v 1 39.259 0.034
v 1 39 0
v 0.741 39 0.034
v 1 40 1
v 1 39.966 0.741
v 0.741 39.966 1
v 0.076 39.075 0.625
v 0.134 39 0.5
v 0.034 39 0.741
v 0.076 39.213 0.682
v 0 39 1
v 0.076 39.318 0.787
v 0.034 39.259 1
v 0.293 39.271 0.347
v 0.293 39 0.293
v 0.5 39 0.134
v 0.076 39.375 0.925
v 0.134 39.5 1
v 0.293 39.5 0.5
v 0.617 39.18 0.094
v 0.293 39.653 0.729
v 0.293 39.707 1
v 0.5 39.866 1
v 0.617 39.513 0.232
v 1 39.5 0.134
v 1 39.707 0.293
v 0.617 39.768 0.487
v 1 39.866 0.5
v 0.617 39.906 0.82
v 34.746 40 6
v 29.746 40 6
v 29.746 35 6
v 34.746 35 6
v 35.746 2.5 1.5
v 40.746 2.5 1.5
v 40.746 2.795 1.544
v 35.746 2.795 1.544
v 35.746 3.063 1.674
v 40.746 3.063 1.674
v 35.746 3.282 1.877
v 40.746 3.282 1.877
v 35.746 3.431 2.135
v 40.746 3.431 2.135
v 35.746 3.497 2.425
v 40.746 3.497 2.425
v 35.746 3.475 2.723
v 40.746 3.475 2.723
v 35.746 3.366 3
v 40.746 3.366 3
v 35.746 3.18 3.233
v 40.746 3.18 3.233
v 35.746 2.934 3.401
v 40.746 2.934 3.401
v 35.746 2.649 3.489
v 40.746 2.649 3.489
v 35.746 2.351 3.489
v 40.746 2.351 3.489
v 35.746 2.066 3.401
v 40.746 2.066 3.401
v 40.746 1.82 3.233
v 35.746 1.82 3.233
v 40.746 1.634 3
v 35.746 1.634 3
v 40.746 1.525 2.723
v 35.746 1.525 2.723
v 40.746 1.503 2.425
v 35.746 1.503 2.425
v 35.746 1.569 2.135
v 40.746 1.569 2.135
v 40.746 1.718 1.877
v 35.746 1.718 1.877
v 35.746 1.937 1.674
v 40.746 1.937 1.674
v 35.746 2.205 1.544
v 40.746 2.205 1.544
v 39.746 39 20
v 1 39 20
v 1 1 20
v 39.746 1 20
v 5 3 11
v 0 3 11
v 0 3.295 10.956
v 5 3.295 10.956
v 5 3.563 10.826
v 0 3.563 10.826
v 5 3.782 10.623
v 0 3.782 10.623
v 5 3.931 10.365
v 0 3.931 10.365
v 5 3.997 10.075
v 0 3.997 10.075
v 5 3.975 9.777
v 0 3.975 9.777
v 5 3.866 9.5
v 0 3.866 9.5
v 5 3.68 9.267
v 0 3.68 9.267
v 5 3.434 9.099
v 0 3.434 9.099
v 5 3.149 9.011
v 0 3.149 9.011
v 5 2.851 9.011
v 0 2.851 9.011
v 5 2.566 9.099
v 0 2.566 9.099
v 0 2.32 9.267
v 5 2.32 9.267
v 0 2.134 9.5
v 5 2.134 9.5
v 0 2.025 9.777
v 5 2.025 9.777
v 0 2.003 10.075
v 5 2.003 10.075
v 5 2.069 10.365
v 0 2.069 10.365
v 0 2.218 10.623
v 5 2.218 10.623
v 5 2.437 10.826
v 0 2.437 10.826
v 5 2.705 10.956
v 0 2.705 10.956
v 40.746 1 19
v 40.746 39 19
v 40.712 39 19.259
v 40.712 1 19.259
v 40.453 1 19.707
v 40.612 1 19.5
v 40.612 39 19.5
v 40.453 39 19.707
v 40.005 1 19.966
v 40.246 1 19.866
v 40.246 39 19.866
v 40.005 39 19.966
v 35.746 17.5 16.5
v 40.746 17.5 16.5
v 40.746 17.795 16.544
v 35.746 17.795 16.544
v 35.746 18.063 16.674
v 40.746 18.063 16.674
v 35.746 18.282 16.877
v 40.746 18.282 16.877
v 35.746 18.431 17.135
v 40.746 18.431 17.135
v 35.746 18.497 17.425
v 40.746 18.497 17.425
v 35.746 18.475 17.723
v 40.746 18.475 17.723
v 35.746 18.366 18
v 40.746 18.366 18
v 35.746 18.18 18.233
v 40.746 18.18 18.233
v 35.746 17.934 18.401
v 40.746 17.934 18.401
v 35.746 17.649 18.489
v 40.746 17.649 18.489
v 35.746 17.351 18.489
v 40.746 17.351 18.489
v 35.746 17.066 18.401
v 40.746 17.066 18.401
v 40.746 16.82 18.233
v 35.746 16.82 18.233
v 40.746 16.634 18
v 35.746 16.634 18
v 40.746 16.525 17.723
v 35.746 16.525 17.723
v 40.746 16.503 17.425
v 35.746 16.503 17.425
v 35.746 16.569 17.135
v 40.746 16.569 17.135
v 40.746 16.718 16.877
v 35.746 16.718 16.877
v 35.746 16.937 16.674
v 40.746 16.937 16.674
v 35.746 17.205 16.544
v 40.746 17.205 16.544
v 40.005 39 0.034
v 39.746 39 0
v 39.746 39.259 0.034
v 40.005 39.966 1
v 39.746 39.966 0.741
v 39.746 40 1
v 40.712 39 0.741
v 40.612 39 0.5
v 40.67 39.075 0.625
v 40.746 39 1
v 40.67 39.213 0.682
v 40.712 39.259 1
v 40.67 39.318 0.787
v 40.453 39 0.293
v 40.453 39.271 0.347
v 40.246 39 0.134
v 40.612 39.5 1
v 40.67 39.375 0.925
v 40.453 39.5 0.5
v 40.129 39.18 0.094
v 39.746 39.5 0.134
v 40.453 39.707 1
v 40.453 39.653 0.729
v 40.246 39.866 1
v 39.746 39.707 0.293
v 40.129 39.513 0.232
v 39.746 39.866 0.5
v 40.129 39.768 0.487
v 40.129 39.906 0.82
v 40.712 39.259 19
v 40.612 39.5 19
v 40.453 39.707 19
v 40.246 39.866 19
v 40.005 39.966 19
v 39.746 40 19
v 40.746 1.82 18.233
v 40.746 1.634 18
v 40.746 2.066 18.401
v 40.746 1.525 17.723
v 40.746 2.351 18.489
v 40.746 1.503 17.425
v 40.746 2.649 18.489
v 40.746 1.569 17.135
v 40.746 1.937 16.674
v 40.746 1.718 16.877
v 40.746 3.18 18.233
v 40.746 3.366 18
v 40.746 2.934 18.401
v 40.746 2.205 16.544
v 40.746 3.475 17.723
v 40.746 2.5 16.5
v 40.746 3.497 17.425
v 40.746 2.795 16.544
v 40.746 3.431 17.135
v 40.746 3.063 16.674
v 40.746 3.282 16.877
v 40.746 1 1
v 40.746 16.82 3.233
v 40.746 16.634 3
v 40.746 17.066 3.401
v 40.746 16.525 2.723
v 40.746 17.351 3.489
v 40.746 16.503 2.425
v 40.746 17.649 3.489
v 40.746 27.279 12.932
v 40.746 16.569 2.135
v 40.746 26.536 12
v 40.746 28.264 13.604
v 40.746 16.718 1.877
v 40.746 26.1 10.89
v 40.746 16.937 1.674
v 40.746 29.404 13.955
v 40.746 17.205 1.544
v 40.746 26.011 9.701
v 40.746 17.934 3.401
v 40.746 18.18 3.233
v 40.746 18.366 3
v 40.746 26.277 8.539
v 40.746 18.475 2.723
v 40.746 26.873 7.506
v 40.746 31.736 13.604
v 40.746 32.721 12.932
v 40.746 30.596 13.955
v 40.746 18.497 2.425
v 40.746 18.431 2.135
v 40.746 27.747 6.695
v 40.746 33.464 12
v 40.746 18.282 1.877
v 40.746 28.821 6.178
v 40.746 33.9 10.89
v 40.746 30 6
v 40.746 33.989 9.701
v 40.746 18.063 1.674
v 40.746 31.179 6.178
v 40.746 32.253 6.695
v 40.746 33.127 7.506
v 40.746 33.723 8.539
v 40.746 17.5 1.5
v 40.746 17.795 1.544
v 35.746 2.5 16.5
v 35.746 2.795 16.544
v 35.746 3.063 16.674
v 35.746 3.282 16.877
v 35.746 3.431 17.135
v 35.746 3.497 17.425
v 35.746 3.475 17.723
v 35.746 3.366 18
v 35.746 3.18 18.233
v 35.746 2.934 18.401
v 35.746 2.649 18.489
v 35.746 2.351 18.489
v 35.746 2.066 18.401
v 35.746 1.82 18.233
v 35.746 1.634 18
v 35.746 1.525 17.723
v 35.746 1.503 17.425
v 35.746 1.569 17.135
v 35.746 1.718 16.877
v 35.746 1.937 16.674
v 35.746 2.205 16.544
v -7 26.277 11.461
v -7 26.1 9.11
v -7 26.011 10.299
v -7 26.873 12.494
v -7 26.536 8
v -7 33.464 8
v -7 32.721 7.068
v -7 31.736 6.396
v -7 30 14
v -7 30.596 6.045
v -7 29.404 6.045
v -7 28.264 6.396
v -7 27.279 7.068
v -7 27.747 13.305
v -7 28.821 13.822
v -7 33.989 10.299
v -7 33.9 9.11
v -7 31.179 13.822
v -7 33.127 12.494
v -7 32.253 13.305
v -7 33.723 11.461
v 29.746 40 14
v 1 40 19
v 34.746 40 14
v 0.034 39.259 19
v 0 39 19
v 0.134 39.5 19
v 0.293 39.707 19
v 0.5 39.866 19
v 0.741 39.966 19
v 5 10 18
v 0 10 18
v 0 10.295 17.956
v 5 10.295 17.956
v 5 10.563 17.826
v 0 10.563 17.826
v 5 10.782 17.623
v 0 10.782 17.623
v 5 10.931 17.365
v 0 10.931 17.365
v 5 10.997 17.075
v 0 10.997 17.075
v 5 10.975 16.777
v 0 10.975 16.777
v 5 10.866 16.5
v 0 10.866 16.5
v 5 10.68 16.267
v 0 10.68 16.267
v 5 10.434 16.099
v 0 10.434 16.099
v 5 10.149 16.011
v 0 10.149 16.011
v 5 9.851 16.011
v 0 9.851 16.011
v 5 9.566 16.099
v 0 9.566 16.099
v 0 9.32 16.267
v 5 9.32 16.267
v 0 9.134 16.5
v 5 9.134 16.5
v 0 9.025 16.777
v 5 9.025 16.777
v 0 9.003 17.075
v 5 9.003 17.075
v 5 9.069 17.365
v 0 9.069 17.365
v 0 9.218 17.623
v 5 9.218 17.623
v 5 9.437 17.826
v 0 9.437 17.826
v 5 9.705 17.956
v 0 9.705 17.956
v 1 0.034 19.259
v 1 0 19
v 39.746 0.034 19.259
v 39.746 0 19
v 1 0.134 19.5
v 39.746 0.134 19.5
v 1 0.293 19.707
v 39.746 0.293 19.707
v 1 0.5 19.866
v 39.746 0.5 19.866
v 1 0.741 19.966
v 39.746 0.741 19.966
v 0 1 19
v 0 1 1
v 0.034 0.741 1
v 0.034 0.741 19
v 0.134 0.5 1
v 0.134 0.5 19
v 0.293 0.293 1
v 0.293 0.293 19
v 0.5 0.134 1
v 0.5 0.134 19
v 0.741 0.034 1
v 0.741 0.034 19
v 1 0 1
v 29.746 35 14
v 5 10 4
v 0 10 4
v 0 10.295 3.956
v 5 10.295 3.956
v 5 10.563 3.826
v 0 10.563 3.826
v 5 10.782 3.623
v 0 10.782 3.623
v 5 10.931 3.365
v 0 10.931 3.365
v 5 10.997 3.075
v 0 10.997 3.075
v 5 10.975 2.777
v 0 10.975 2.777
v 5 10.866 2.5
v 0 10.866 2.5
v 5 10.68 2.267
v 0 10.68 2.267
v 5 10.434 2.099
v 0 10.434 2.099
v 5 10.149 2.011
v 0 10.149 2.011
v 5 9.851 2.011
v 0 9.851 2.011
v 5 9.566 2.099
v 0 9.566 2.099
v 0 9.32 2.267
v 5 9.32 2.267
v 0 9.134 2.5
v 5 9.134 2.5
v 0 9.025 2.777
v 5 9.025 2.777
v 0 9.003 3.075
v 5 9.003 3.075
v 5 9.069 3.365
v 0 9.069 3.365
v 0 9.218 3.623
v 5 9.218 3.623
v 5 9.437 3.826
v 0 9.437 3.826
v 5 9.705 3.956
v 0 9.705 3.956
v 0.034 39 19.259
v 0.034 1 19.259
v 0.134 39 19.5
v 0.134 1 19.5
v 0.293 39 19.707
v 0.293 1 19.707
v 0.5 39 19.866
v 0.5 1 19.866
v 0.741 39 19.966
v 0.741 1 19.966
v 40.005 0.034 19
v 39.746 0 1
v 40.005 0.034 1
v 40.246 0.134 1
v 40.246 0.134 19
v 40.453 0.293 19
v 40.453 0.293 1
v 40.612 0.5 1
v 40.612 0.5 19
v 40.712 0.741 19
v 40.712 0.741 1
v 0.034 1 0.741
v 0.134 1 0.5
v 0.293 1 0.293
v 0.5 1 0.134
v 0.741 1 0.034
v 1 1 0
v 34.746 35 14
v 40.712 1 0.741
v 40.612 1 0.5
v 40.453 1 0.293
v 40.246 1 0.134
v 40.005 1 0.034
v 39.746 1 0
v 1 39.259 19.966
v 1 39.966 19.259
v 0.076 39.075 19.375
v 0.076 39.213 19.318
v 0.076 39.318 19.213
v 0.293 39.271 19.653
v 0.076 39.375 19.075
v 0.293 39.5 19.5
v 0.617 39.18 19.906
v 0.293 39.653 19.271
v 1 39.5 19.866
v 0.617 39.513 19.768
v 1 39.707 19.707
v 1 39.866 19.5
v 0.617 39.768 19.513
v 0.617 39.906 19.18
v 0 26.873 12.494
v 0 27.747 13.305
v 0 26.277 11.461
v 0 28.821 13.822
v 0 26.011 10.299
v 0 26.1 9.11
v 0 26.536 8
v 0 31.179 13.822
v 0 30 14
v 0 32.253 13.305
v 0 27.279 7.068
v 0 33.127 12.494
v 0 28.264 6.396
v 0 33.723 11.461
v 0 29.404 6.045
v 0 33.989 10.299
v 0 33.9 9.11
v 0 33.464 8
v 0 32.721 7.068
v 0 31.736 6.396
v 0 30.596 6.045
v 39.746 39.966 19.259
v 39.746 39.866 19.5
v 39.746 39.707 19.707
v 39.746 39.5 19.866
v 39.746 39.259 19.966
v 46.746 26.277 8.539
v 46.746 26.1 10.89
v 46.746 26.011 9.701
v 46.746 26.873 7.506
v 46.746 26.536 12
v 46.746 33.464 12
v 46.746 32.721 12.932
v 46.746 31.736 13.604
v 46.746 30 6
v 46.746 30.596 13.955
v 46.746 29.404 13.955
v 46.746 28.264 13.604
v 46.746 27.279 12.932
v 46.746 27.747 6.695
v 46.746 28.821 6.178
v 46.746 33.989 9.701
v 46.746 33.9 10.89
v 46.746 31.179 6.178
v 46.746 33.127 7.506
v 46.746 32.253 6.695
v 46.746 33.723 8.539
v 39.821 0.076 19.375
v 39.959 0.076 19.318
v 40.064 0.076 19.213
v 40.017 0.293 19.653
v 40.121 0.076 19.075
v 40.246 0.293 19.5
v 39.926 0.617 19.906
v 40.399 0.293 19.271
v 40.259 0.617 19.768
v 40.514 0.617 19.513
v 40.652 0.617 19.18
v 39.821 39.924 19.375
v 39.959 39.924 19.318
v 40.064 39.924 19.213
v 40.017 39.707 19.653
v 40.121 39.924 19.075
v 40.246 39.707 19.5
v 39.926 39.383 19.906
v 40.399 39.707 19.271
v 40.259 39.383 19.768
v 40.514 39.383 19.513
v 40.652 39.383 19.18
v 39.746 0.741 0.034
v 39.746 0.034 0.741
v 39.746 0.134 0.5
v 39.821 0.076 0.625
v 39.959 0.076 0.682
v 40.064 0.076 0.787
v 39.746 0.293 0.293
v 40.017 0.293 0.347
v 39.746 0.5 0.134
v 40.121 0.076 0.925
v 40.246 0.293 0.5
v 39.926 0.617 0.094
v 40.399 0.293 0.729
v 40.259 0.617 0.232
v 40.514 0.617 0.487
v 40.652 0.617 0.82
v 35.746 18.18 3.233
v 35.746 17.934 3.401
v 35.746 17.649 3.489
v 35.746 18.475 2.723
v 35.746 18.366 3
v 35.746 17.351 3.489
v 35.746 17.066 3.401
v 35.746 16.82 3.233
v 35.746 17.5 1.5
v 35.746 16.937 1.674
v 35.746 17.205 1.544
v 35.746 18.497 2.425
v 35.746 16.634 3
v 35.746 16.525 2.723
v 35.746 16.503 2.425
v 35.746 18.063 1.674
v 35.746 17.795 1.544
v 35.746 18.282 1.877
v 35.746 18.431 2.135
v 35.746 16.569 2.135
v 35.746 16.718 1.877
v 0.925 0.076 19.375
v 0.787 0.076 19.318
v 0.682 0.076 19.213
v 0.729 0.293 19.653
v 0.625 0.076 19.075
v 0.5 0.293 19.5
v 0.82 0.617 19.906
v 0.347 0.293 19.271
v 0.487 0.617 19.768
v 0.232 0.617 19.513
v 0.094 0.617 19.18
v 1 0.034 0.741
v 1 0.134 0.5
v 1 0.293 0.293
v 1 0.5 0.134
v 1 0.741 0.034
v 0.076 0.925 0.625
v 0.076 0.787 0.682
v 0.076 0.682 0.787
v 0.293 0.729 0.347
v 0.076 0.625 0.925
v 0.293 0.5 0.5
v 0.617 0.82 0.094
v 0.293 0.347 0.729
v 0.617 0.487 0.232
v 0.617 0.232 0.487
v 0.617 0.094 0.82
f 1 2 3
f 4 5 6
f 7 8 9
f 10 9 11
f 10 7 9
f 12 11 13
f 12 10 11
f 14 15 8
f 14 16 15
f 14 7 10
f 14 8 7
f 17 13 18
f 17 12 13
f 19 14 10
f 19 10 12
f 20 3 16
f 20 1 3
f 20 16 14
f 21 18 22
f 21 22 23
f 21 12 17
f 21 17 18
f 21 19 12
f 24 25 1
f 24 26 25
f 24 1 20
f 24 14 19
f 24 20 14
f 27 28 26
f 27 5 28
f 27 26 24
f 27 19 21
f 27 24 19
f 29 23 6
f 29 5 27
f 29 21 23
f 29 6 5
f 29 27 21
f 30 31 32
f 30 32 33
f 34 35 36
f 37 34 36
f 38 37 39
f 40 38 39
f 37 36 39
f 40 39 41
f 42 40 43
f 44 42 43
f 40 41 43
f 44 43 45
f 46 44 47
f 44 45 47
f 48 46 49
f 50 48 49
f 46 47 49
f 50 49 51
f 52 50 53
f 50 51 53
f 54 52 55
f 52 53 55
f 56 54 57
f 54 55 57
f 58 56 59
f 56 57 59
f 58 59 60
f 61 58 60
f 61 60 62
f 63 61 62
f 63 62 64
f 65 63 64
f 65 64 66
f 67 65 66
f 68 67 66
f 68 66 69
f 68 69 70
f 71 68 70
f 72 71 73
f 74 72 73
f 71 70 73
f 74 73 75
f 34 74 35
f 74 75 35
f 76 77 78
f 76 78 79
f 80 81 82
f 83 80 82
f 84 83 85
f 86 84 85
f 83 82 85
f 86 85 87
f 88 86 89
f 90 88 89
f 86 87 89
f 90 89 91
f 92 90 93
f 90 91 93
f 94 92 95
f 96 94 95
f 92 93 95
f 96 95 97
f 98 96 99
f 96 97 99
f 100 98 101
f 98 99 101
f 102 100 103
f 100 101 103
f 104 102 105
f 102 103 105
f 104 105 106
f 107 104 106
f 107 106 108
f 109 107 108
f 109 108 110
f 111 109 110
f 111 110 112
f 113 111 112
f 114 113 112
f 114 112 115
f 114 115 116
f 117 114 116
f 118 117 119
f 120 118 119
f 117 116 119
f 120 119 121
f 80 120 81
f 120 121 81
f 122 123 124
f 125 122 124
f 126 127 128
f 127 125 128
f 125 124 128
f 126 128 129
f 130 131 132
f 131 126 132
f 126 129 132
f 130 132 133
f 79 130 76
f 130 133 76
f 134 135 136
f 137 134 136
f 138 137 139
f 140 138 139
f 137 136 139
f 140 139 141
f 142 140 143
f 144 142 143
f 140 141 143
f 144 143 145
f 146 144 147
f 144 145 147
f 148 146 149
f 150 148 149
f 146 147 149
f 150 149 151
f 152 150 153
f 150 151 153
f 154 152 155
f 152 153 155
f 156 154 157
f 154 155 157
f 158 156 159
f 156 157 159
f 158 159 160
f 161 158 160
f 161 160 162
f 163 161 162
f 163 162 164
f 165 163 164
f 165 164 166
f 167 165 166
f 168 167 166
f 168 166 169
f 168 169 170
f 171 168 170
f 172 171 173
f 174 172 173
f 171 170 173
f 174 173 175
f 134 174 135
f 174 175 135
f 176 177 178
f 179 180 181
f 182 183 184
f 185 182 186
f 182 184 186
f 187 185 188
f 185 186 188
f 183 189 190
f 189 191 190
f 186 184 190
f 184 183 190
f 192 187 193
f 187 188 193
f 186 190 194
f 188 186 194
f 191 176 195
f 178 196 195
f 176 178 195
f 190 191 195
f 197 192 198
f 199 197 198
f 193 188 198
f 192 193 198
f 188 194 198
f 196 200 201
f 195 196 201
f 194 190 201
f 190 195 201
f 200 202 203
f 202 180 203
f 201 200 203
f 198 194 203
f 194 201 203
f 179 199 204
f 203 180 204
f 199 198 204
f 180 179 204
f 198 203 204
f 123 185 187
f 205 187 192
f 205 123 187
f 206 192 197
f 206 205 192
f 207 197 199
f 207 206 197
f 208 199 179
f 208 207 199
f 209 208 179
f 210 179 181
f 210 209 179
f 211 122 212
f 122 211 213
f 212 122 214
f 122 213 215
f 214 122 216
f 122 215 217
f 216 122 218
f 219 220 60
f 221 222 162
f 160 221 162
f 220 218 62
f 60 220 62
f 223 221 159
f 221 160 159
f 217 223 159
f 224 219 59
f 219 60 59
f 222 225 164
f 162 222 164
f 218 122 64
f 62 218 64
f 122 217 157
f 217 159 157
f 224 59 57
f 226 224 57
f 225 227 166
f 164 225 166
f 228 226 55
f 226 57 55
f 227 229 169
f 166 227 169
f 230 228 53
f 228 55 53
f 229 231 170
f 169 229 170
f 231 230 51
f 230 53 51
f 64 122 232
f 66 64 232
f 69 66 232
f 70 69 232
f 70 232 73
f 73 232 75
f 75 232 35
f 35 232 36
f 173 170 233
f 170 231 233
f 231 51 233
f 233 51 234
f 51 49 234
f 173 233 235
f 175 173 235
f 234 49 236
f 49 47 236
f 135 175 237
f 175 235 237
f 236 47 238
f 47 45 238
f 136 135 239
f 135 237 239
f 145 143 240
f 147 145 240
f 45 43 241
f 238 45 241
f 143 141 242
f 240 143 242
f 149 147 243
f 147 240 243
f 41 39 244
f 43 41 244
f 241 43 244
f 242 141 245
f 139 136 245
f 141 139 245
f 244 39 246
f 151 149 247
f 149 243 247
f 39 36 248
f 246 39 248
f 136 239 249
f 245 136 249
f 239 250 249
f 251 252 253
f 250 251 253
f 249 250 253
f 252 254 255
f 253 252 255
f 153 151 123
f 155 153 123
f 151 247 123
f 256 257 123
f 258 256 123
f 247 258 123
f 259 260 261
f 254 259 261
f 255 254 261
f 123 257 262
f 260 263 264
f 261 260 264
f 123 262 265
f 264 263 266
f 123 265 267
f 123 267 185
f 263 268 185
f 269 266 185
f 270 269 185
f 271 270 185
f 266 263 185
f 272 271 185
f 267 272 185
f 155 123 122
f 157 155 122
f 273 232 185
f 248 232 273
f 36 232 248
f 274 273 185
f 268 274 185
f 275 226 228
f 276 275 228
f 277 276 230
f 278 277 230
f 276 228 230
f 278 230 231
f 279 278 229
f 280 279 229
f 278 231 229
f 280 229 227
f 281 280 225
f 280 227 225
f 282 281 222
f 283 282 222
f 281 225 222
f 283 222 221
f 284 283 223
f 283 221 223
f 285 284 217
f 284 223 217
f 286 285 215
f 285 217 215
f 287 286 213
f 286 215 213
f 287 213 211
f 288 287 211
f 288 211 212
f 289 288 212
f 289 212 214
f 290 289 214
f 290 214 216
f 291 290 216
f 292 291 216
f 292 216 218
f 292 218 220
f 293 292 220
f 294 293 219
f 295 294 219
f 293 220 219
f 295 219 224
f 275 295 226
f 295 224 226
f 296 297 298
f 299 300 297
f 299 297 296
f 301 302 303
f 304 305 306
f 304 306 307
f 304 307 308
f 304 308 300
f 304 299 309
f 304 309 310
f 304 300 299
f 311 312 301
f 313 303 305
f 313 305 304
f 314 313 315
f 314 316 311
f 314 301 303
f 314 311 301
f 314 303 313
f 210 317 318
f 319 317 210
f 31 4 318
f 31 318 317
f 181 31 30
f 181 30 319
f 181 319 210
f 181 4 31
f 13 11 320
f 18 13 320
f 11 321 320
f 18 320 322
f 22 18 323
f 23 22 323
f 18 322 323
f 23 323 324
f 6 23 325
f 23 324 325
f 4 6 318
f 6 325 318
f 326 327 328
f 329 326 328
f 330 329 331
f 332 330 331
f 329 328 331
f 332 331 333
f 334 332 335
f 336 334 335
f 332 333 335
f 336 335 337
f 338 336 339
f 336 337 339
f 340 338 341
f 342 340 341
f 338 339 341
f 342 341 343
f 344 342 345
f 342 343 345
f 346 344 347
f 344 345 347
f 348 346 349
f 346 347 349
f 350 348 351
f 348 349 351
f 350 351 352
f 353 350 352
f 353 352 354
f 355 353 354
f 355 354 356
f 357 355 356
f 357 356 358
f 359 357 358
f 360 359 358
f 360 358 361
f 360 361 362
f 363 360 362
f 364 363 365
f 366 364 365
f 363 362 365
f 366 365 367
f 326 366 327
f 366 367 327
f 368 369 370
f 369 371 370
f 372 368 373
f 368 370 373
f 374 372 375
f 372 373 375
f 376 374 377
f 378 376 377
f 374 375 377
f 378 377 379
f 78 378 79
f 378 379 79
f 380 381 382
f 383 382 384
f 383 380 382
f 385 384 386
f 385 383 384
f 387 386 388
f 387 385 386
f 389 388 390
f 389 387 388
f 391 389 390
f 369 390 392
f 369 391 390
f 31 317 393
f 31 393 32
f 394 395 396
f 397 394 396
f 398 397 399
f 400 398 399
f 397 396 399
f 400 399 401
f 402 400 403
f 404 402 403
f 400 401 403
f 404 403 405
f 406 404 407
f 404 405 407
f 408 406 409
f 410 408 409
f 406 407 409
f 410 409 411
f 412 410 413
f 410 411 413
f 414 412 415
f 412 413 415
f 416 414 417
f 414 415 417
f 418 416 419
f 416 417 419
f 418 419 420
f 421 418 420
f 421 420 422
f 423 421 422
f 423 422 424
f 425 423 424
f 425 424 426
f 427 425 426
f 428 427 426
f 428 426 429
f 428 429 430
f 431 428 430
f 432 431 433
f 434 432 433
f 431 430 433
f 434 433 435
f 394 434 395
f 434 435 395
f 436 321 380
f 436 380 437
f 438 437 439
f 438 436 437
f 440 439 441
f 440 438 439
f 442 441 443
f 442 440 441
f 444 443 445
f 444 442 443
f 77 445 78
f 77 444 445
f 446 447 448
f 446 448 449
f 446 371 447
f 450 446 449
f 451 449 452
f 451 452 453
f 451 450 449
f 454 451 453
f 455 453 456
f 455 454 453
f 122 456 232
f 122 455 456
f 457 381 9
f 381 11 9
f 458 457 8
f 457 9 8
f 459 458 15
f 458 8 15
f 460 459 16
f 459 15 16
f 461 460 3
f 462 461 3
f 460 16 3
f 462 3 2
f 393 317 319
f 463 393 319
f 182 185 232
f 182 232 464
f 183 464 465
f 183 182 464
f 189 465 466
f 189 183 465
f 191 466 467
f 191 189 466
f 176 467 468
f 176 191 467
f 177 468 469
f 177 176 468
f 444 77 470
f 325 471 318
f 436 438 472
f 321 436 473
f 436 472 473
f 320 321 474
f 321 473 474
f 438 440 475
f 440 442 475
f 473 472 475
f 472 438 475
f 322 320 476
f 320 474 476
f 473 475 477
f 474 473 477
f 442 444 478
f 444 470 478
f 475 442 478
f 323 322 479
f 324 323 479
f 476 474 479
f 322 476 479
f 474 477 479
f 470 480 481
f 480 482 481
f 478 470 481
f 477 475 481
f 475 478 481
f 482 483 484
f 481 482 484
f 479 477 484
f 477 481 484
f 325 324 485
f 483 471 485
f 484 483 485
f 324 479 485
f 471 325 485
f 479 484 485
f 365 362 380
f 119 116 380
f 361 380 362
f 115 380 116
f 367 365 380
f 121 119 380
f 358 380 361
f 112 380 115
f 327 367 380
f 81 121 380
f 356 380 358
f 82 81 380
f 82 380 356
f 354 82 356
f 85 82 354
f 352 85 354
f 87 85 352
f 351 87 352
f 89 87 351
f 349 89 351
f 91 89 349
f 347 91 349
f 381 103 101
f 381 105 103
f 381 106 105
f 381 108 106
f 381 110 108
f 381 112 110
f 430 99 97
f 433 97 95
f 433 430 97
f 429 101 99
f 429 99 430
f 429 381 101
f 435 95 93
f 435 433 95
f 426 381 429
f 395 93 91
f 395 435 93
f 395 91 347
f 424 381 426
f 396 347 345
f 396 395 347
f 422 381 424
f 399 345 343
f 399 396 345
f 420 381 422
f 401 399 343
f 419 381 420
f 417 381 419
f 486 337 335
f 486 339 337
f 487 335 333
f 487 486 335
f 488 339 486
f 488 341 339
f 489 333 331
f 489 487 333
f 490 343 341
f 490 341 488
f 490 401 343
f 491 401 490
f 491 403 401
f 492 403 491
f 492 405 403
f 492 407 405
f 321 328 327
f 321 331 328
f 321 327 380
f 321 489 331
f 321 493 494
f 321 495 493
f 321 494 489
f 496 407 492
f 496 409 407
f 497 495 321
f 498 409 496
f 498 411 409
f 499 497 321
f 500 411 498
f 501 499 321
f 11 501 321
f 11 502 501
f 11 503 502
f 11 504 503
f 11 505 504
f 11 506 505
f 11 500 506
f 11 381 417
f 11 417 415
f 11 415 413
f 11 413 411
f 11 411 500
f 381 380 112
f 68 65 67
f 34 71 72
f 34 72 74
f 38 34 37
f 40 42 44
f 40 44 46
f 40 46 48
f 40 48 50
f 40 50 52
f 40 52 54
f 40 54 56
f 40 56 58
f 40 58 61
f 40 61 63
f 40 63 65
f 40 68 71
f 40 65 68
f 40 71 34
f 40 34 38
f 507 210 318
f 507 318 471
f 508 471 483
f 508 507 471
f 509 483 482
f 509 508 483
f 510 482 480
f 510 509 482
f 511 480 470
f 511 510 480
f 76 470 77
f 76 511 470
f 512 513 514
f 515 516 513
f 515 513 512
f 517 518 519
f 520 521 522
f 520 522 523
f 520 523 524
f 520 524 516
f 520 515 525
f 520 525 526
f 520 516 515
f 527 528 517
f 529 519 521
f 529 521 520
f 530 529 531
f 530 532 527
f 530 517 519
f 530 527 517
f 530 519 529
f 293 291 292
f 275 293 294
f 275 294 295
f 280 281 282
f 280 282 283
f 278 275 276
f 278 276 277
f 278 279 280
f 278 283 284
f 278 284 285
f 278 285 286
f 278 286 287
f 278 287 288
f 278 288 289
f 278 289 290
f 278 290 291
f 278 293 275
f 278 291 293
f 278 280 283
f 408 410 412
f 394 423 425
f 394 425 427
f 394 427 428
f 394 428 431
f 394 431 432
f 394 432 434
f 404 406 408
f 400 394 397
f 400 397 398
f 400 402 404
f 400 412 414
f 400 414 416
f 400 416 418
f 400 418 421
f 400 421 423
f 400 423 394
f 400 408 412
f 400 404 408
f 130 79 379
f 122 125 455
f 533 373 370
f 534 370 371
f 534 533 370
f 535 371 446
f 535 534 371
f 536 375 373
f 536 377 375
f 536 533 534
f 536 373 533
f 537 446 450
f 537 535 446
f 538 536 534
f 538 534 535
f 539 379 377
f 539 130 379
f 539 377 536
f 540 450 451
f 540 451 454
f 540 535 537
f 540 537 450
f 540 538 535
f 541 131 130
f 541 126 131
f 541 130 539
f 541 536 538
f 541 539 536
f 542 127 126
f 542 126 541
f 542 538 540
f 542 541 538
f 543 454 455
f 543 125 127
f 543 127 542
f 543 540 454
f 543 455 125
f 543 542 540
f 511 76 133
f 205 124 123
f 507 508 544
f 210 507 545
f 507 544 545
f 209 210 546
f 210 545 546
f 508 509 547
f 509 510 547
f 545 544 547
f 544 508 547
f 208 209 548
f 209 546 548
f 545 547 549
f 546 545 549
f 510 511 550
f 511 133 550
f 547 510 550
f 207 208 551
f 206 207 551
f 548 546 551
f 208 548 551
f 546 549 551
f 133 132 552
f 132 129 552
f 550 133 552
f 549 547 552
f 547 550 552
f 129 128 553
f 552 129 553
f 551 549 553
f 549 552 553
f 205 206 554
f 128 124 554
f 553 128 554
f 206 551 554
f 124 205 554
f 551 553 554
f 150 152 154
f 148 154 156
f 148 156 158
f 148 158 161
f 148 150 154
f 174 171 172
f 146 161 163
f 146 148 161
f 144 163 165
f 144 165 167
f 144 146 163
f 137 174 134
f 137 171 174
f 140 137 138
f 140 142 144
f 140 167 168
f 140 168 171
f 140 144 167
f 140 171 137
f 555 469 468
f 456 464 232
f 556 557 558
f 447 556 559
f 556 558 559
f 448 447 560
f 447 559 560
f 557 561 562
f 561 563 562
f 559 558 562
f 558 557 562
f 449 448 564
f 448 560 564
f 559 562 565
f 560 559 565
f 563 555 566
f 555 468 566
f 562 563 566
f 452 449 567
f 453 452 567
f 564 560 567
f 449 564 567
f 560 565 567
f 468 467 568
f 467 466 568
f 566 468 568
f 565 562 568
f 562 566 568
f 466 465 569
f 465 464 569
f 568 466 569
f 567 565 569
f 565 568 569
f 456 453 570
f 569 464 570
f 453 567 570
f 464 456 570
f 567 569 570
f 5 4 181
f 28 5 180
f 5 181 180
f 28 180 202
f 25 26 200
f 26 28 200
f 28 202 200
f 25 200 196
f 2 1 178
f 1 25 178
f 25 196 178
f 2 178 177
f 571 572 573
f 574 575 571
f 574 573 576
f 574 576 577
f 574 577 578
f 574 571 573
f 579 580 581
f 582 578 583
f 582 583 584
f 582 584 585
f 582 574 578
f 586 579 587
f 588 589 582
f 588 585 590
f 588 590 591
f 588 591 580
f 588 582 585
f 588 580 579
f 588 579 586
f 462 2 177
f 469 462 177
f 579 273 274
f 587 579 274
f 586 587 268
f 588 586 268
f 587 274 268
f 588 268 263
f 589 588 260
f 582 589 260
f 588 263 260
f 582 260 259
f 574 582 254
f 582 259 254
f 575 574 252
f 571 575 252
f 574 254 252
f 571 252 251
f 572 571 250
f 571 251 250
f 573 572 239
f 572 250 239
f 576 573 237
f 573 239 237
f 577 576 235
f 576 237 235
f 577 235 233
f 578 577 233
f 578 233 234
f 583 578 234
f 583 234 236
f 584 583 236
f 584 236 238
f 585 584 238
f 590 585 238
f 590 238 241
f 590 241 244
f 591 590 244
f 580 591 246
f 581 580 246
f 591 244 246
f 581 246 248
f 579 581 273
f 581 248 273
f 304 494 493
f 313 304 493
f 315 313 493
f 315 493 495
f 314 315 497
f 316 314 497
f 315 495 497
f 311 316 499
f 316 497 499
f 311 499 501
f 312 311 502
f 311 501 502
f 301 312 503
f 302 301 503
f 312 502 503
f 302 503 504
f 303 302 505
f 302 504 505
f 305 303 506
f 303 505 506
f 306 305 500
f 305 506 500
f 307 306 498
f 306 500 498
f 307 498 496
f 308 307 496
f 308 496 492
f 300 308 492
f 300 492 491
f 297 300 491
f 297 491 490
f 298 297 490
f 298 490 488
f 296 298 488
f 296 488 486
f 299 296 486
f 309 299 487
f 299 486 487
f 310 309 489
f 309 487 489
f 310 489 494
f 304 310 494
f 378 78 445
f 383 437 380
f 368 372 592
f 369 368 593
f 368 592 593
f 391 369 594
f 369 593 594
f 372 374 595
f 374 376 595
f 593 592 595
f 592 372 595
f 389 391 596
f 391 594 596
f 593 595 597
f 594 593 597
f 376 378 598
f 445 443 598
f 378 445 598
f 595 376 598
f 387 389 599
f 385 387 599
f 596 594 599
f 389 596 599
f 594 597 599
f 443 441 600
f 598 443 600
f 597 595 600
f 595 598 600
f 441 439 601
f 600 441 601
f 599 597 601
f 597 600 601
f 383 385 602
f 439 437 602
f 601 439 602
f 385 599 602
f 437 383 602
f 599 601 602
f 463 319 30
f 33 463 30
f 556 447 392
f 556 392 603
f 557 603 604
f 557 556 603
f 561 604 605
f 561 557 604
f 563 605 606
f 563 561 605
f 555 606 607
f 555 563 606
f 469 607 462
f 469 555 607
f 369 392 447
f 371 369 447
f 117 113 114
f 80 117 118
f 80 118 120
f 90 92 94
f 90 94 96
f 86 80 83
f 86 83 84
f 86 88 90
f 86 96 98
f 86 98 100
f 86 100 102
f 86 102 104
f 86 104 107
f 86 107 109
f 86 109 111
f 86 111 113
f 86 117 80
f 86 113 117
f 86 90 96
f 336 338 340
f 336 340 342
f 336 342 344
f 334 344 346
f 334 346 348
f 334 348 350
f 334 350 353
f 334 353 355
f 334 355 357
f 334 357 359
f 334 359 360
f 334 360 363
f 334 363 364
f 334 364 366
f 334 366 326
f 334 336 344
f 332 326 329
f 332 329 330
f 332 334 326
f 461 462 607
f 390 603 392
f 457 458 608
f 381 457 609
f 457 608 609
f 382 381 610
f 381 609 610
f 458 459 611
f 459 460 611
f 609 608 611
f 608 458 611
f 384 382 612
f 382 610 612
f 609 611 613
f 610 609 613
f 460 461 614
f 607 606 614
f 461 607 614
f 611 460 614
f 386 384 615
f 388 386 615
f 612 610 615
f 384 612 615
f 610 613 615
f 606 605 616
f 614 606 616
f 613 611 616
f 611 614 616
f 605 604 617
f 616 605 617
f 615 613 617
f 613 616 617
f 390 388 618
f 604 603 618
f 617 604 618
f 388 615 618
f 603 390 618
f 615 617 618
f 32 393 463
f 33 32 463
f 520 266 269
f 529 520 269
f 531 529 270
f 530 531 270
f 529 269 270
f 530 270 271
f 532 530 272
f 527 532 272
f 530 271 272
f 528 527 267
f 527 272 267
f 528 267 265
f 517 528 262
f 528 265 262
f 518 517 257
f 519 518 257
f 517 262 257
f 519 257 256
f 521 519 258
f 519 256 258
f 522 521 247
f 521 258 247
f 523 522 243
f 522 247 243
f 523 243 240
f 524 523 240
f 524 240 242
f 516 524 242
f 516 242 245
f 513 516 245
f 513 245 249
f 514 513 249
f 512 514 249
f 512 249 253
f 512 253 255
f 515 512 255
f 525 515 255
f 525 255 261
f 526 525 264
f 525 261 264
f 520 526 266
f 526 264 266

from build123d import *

# Parameters (mm, degrees)
SKETCH1_W           = 40.745918
SKETCH1_H           = 40
BOSS_EXTRUDE1_DEPTH = 20
FILLET1_R           = 1
SKETCH2_R           = 4
BOSS_EXTRUDE2_DEPTH = 6
SKETCH3_W           = 5
SKETCH3_H           = 8
CUT_EXTRUDE1_DEPTH  = 5
SKETCH4_R           = 4
BOSS_EXTRUDE3_DEPTH = 7
SKETCH5_R           = 1
CUT_EXTRUDE2_DEPTH  = 5
SKETCH6_R           = 1
CUT_EXTRUDE3_DEPTH  = 5


with BuildPart() as part:
    # Sketch1 → Boss-Extrude1 (new body)
    with BuildSketch(Plane.XY):
        with Locations((20.372959, 20)):
            Rectangle(SKETCH1_W, SKETCH1_H)
    extrude(amount=BOSS_EXTRUDE1_DEPTH)

    # Fillet1
    fillet1_edges = [part.edges().sort_by_distance(p)[0] for p in [
        (40.745918, 20, 20),
        (20.372959, 40, 20),
        (0, 20, 20),
        (20.372959, 40, 0),
        (40.745918, 20, 0),
        (20.372959, 0, 0),
        (0, 20, 0),
        (20.372959, 0, 20),
        (0, 40, 10),
        (40.745918, 40, 10),
        (40.745918, 0, 10),
        (0, 0, 10),
    ]]
    fillet(fillet1_edges, radius=FILLET1_R)

    # Sketch2 → Boss-Extrude2 (add)
    with BuildSketch(Plane(origin=(40.745918, 0, 0), x_dir=(0, 0, -1), z_dir=(1, 0, 0))):
        with Locations((-10, 30)):
            Circle(SKETCH2_R)
    extrude(amount=BOSS_EXTRUDE2_DEPTH)

    # Sketch3 → Cut-Extrude1 (cut)
    with BuildSketch(Plane(origin=(0, 40, 0), x_dir=(1, 0, 0), z_dir=(0, 1, 0))):
        with Locations((32.245918, -10)):
            Rectangle(SKETCH3_W, SKETCH3_H)
    extrude(amount=-CUT_EXTRUDE1_DEPTH, mode=Mode.SUBTRACT)

    # Sketch4 → Boss-Extrude3 (add)
    with BuildSketch(Plane.ZY):
        with Locations((10, 30)):
            Circle(SKETCH4_R)
    extrude(amount=BOSS_EXTRUDE3_DEPTH)

    # Sketch5 → Cut-Extrude2 (cut)
    with BuildSketch(Plane(origin=(40.745918, 0, 0), x_dir=(0, 0, -1), z_dir=(1, 0, 0))):
        with Locations((-17.5, 17.5)):
            Circle(SKETCH5_R)
        with Locations((-2.5, 17.5)):
            Circle(SKETCH5_R)
        with Locations((-2.5, 2.5)):
            Circle(SKETCH5_R)
        with Locations((-17.5, 2.5)):
            Circle(SKETCH5_R)
    extrude(amount=-CUT_EXTRUDE2_DEPTH, mode=Mode.SUBTRACT)

    # Sketch6 → Cut-Extrude3 (cut)
    with BuildSketch(Plane.ZY):
        with Locations((17, 10)):
            Circle(SKETCH6_R)
        with Locations((10, 3)):
            Circle(SKETCH6_R)
        with Locations((3, 10)):
            Circle(SKETCH6_R)
    extrude(amount=-CUT_EXTRUDE3_DEPTH, mode=Mode.SUBTRACT)


solid = part.part
